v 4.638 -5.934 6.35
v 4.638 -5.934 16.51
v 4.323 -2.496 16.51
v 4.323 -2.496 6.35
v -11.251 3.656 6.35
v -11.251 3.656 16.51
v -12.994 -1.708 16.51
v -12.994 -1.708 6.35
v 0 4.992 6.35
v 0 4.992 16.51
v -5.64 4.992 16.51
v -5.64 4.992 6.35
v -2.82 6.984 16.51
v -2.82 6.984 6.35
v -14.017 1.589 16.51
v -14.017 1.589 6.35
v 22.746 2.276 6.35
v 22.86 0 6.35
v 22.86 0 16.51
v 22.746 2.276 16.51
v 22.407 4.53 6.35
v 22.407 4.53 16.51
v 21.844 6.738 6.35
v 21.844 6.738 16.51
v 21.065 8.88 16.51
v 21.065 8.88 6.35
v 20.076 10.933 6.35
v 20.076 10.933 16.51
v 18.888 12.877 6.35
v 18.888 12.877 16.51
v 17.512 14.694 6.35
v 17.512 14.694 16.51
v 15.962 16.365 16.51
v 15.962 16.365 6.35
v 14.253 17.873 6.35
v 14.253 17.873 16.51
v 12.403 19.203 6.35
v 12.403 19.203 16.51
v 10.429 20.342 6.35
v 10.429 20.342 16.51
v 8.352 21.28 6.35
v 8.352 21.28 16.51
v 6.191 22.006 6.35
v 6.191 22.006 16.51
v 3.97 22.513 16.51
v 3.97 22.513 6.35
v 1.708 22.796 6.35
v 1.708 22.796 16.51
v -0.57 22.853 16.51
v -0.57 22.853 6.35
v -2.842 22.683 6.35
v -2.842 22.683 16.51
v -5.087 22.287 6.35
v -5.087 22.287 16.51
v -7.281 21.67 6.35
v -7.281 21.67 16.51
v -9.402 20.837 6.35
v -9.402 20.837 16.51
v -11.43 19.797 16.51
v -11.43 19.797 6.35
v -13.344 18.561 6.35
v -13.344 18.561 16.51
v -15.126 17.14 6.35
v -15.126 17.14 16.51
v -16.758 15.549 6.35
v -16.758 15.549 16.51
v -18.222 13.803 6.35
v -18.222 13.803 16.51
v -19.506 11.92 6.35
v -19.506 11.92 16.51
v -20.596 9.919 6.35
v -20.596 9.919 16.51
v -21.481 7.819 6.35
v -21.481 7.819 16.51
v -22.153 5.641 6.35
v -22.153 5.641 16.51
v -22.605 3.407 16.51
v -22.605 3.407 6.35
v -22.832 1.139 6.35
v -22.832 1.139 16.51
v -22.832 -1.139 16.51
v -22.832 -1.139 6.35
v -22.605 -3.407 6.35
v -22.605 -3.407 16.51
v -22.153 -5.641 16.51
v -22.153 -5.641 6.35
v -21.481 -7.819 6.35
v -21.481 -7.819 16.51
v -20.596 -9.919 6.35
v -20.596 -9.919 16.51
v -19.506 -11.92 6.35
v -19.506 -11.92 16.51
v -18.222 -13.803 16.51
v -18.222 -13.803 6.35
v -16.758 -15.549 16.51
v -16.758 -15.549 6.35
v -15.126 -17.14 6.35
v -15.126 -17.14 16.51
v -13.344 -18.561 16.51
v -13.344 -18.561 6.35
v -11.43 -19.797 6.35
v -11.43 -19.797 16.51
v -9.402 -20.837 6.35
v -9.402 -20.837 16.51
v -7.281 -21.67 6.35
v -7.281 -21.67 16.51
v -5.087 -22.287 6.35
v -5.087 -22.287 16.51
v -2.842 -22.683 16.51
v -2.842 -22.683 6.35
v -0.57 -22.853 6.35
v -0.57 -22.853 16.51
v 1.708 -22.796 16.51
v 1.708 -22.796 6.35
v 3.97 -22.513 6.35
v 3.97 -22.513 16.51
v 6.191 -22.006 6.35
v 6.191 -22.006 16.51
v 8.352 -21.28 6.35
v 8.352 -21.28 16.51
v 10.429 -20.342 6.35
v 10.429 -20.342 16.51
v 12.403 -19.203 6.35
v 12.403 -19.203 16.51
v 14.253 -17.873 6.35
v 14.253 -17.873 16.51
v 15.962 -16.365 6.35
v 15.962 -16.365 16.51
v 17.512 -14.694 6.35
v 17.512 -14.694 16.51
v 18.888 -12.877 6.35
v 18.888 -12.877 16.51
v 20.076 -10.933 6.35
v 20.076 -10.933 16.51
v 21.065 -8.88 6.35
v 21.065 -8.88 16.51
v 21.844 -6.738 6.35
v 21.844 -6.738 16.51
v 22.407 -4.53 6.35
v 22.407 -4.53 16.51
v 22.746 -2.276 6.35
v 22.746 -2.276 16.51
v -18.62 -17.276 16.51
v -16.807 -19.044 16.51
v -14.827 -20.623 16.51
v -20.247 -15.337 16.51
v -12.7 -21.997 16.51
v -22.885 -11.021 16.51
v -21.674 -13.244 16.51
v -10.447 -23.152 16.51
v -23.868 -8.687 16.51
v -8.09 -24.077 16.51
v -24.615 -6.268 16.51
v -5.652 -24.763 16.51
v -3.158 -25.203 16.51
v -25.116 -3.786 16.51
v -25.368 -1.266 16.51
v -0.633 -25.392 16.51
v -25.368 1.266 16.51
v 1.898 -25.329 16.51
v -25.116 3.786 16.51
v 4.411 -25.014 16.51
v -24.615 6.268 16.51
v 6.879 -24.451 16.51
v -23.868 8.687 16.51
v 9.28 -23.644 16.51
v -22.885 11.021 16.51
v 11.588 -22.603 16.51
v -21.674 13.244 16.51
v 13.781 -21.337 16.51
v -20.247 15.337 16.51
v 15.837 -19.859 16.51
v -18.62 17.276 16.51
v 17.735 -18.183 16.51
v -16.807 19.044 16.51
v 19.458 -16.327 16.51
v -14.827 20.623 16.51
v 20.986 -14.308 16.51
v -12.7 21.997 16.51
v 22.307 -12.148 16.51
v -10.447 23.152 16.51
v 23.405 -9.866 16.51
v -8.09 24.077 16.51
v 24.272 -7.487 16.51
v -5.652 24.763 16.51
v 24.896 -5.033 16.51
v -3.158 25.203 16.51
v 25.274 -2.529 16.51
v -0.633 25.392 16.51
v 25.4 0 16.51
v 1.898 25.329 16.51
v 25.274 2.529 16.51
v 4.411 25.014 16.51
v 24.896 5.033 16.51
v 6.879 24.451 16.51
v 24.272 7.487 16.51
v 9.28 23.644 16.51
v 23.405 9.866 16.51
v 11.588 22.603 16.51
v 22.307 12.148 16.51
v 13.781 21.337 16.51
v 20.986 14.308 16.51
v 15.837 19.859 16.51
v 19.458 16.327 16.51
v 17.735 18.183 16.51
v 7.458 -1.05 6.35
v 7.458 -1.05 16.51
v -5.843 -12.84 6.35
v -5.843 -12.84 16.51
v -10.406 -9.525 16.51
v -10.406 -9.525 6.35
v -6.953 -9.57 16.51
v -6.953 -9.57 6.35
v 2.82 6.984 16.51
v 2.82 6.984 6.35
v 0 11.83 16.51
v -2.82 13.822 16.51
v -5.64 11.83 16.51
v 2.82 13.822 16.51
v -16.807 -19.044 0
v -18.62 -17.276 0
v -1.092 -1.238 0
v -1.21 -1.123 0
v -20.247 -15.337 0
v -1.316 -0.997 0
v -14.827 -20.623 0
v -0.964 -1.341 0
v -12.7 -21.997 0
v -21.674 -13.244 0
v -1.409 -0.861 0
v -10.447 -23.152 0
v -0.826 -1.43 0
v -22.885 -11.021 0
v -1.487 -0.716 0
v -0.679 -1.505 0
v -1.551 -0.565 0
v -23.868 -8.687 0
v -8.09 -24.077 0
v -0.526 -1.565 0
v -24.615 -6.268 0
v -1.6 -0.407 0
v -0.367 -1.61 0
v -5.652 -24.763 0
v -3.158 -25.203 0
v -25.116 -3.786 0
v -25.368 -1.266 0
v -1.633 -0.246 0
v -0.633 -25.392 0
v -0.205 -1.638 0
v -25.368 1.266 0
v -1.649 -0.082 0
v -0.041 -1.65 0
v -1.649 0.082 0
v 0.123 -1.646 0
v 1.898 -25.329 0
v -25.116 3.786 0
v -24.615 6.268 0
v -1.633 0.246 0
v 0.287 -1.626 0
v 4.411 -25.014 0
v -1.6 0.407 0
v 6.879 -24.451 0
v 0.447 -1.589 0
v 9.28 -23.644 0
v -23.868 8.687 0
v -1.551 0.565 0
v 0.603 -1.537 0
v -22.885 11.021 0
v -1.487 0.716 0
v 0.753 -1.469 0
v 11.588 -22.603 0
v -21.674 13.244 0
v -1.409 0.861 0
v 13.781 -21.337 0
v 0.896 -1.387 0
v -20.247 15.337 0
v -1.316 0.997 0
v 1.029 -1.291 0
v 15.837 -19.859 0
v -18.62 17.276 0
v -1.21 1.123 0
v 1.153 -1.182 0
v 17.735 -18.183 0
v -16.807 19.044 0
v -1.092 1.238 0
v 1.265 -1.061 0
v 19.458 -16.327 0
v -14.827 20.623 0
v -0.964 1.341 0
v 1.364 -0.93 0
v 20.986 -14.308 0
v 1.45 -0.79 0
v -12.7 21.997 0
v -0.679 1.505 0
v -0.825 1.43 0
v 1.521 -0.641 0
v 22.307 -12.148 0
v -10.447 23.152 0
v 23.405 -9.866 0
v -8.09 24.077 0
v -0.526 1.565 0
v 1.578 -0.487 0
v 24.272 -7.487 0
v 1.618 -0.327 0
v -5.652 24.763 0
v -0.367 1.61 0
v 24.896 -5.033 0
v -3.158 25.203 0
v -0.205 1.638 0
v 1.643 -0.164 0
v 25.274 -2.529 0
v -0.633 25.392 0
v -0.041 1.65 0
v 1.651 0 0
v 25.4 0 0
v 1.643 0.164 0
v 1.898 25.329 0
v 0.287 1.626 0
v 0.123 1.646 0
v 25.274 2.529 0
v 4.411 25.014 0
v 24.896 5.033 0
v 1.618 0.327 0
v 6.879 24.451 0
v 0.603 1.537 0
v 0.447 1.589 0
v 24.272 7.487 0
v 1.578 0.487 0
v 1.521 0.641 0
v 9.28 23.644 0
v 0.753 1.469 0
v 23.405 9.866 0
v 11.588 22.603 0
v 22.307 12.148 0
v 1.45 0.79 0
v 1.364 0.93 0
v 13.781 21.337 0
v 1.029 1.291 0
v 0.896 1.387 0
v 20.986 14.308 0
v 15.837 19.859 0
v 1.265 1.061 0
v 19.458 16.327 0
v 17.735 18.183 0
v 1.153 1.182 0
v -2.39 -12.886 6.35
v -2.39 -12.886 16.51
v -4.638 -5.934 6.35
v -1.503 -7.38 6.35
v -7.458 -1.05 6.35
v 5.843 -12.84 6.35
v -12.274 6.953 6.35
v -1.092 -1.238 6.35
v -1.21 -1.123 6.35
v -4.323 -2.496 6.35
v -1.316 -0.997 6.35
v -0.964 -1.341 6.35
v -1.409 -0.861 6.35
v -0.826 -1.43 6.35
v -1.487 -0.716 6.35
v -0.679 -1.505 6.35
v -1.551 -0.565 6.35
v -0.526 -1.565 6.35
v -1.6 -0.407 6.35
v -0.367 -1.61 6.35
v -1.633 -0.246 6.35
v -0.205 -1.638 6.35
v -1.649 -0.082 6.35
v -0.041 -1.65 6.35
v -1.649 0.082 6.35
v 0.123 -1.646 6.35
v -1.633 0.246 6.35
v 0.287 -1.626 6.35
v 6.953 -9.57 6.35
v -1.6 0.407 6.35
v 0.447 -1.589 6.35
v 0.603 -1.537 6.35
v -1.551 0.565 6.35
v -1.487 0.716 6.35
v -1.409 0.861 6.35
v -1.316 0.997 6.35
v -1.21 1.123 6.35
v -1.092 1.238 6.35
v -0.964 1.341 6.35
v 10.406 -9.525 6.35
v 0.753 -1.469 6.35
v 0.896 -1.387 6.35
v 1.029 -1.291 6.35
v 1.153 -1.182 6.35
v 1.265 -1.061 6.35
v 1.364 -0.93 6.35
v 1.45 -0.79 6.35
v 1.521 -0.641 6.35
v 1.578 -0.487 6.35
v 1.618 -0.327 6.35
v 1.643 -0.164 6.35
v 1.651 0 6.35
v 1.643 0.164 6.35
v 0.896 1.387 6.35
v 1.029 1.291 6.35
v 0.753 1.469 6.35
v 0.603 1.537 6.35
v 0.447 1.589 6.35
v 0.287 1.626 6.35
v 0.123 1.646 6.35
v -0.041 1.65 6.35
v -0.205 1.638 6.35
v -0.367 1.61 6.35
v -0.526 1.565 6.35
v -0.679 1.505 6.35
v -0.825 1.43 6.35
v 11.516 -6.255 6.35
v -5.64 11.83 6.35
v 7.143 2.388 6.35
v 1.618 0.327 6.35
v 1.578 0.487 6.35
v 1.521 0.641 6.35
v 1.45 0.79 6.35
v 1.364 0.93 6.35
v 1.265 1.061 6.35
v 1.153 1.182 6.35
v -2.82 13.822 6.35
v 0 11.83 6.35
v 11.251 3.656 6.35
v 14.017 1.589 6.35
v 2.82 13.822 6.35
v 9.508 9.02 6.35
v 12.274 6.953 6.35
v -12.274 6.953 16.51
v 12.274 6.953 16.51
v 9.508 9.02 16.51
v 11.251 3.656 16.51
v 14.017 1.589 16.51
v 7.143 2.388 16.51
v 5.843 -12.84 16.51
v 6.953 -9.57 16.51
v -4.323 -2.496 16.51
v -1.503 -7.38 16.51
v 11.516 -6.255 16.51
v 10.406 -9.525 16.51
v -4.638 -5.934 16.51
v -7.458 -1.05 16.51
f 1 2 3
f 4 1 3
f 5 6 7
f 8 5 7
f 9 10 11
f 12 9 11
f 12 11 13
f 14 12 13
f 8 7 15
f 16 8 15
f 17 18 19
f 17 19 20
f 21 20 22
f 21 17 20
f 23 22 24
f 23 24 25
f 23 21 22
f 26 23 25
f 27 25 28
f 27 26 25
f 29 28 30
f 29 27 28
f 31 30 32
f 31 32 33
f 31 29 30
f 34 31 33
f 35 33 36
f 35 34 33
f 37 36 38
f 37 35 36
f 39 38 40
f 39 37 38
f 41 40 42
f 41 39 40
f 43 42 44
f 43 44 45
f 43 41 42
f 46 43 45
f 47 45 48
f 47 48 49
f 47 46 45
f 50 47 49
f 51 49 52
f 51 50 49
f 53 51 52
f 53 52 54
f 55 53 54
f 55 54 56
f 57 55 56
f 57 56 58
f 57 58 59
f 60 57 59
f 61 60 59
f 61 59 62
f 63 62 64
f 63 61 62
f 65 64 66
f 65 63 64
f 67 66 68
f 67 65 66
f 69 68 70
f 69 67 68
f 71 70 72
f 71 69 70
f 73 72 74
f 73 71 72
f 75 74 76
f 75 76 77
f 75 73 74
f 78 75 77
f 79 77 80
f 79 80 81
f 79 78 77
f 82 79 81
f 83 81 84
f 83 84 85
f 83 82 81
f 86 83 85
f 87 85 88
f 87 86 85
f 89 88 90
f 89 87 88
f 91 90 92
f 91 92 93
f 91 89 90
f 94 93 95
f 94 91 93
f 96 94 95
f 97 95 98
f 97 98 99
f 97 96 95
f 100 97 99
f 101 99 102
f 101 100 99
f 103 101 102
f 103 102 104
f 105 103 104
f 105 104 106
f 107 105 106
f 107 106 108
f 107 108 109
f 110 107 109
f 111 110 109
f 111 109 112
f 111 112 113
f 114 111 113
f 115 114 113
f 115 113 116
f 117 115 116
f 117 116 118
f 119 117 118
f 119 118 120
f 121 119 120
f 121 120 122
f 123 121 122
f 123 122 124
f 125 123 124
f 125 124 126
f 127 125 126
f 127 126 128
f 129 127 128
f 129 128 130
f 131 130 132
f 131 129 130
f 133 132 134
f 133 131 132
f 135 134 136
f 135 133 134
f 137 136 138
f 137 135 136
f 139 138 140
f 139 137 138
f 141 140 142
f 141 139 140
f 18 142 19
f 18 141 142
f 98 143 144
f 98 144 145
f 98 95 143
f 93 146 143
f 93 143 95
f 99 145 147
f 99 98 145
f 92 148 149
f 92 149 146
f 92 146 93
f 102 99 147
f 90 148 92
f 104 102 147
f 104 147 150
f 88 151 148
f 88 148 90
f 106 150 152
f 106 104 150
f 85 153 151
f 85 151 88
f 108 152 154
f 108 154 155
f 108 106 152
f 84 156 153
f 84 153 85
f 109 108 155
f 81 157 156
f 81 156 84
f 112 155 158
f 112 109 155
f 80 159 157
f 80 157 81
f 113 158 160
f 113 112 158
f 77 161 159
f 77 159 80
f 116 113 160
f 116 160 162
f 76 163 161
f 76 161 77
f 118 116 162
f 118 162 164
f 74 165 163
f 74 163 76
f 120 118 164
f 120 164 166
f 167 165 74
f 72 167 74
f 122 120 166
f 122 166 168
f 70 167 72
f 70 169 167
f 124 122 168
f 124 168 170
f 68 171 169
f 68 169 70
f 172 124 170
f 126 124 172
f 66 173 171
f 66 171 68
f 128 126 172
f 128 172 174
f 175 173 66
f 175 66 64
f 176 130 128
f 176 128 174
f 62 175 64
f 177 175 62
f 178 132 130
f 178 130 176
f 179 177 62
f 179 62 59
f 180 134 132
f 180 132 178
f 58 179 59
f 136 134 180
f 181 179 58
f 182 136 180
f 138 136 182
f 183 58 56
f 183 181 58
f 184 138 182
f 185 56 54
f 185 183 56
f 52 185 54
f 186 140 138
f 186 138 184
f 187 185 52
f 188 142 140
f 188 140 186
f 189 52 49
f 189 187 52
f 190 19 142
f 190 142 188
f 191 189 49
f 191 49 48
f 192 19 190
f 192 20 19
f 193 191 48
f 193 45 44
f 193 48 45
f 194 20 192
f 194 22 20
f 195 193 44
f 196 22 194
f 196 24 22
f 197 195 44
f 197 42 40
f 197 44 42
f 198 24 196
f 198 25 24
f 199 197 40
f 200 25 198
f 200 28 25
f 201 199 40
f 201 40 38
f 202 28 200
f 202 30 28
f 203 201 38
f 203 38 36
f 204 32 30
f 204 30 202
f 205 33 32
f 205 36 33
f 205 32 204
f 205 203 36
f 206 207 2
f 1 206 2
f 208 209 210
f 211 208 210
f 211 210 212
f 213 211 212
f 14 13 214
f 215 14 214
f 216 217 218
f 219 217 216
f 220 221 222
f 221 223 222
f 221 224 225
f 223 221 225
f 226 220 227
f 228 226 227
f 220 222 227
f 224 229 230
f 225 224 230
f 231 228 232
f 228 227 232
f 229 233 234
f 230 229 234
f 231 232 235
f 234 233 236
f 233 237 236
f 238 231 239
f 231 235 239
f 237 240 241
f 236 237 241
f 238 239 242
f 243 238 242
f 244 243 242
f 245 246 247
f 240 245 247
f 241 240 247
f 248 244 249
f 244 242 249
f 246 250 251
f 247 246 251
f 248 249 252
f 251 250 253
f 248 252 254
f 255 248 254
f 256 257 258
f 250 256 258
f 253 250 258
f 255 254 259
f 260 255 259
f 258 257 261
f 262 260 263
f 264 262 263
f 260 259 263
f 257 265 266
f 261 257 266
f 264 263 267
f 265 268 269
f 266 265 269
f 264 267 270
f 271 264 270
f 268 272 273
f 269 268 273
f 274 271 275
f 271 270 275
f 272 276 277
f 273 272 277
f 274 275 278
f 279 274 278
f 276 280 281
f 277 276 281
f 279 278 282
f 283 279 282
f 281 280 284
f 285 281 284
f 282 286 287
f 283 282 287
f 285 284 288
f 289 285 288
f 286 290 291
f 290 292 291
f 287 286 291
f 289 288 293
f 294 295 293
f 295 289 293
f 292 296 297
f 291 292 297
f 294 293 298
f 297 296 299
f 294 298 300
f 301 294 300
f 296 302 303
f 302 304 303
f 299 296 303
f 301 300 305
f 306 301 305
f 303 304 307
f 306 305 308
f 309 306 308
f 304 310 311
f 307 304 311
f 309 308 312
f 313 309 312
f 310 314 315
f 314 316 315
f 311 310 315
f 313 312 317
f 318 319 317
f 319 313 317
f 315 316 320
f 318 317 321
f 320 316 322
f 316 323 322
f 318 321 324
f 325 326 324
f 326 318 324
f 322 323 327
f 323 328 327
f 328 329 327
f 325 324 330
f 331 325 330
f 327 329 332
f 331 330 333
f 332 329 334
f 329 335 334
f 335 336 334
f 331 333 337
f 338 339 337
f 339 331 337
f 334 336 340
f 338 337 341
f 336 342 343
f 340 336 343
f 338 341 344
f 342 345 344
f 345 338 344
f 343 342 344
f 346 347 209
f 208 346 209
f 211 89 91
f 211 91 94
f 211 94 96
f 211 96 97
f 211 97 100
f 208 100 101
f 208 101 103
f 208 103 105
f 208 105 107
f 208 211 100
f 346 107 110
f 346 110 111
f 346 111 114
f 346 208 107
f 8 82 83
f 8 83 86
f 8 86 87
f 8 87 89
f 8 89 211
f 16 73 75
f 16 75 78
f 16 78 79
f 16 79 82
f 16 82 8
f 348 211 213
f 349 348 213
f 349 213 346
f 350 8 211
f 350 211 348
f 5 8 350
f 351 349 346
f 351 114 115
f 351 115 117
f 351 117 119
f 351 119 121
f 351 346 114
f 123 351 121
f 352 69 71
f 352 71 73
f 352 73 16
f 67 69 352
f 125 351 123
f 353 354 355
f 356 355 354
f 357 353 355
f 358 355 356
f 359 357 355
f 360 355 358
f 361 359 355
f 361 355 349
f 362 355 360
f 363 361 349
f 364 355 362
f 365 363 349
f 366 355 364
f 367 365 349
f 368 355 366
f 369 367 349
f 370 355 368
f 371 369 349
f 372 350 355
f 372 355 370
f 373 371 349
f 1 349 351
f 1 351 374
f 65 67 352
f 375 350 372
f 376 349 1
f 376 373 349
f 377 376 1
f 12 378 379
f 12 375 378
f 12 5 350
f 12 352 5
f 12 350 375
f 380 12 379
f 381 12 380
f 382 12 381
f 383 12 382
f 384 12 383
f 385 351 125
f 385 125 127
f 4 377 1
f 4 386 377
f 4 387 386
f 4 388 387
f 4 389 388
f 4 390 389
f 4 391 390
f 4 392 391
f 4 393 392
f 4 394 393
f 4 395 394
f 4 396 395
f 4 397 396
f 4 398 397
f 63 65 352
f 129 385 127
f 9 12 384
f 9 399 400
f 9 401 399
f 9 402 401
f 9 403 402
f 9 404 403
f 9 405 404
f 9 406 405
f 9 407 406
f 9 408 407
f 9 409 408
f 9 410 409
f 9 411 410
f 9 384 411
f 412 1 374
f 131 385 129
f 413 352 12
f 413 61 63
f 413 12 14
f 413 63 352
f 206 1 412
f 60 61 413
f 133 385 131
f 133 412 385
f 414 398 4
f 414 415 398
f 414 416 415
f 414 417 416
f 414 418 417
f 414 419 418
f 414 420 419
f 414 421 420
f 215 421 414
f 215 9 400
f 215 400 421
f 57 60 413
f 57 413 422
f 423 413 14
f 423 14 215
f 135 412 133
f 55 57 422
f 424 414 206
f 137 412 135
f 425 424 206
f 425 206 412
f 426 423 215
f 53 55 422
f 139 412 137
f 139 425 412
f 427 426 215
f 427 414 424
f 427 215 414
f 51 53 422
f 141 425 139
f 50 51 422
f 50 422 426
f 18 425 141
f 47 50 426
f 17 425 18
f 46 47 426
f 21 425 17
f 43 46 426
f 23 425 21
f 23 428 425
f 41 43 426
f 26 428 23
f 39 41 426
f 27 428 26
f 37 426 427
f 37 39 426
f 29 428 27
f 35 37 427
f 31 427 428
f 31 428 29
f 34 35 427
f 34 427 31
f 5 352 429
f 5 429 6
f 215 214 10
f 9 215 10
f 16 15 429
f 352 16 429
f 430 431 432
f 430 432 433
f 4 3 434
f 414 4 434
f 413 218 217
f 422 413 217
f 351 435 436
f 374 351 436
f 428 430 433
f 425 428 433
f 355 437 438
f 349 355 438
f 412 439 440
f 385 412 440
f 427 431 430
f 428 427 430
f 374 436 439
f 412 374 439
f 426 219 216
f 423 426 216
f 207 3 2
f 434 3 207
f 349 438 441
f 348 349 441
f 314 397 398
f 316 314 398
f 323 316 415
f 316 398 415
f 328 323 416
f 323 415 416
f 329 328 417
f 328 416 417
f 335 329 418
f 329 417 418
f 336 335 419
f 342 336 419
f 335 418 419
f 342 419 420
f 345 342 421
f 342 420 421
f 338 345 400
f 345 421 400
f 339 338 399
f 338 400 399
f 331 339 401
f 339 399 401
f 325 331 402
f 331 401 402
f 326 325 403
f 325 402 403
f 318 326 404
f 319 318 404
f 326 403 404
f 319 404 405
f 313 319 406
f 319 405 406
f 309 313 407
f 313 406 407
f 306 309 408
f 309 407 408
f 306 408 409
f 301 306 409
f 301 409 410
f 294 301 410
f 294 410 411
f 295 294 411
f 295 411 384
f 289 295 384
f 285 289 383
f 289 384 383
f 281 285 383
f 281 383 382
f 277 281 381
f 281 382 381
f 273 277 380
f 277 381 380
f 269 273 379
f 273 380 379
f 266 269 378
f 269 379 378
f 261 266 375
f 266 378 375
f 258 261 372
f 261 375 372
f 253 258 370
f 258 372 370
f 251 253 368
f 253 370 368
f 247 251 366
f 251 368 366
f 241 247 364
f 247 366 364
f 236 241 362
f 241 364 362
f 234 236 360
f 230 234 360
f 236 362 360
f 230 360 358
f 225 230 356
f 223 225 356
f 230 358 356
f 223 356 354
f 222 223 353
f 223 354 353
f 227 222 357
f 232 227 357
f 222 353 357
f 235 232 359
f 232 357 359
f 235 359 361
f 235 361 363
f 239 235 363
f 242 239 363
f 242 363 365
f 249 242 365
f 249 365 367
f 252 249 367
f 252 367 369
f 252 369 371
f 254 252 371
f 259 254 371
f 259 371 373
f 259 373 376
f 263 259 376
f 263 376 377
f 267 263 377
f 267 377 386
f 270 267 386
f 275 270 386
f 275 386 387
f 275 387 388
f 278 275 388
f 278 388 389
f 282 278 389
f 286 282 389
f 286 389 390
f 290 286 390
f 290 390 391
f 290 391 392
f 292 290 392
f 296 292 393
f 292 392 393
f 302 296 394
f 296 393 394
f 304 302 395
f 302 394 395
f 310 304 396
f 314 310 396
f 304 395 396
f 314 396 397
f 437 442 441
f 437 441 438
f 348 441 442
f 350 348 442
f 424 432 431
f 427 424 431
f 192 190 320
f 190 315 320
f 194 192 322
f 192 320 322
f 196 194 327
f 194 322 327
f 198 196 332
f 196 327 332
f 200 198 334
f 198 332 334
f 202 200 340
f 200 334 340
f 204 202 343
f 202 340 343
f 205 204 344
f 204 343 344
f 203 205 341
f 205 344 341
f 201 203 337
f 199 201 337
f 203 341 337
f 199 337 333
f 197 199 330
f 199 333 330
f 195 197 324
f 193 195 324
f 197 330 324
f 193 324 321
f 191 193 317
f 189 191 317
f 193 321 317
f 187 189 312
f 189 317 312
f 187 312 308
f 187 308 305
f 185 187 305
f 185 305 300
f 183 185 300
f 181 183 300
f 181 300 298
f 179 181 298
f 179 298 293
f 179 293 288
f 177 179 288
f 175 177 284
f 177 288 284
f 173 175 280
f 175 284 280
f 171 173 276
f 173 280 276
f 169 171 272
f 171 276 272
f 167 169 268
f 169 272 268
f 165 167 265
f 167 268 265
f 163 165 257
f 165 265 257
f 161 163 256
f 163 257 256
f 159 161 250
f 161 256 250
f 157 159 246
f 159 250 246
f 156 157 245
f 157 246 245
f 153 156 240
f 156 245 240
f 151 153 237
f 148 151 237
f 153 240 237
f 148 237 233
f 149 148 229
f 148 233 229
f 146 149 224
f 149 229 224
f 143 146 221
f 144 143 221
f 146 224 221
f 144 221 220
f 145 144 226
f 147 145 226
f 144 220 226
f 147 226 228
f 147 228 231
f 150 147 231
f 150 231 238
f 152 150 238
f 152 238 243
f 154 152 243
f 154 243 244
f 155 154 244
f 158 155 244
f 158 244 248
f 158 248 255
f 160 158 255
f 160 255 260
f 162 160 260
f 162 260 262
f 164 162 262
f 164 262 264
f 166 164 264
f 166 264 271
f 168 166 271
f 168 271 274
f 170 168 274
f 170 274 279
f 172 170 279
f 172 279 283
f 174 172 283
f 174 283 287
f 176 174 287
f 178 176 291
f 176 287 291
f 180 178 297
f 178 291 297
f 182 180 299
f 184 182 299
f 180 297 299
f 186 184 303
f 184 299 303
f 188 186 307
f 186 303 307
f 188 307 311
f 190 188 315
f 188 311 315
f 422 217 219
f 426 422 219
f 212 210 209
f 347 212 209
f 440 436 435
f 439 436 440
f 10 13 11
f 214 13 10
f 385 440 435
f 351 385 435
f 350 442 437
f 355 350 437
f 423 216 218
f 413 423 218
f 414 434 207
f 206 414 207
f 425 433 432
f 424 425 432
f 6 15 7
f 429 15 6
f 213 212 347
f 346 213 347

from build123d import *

# Parameters (mm, degrees)
F0_R     = 25.4
F1_DEPTH = 6.35
F2_R     = 22.86
F3_DEPTH = 10.16
F4_R     = 22.86
F4_R_2   = 20.32
F4_R_3   = 14.8488227635
F5_DEPTH = 10.16
F6_R     = 25.4
F6_R_2   = 22.86
F7_DEPTH = 10.16
F8_R     = 1.651
F9_DEPTH = 6.35


with BuildPart() as f1:
    # F0 (on Top) → F1 (new body)
    with BuildSketch(Plane.XY):
        Circle(F0_R)
    extrude(amount=F1_DEPTH)

    # F2 (on face) → F3 (join)
    with BuildSketch(Plane.XY.offset(6.35)):
        Circle(F2_R)
    extrude(amount=F3_DEPTH)

    # F4 (on face) → F5 (cut)
    with BuildSketch(Plane.XY.offset(16.51)):
        Circle(F4_R)
        Circle(F4_R_2, mode=Mode.SUBTRACT)
        Circle(F4_R_2)
        with BuildLine():
            ThreePointArc((2.8200390162, 17.158628647), (13.2553445021, 11.254643452), (17.3888227635, 0))
            ThreePointArc((17.3888227635, 0), (-11.254643452, -13.2553445021), (-2.8200390162, 17.158628647))
            ThreePointArc((-2.8200390162, 17.158628647), (0, 17.3888227635), (2.8200390162, 17.158628647))
        make_face(mode=Mode.SUBTRACT)
        with BuildLine():
            ThreePointArc((-2.8200390162, 17.158628647), (-11.254643452, -13.2553445021), (17.3888227635, 0))
            ThreePointArc((17.3888227635, 0), (13.2553445021, 11.254643452), (2.8200390162, 17.158628647))
            Line((2.8200390162, 17.158628647), (-2.8200390162, 17.158628647))
        make_face()
        Circle(F4_R_3, mode=Mode.SUBTRACT)
        Circle(F4_R_3)
        Polygon((-10.4057336106, -9.5245266735), (-6.9533198674, -9.5704237527), (-2.3904008896, -12.8855784419), (-5.8428146328, -12.8396813627), align=None, mode=Mode.SUBTRACT)
        Polygon((-7.4583858915, -1.049800532), (-4.3231170224, -2.4959527766), (-1.5030780063, -7.380403632), (-4.6383468754, -5.9342513873), align=None, mode=Mode.SUBTRACT)
        Polygon((5.8428146328, -12.8396813627), (6.9533198674, -9.5704237527), (11.5162388451, -6.2552690636), (10.4057336106, -9.5245266735), align=None, mode=Mode.SUBTRACT)
        Polygon((4.6383468754, -5.9342513873), (4.3231170224, -2.4959527766), (7.1431560386, 2.3884980787), (7.4583858915, -1.049800532), align=None, mode=Mode.SUBTRACT)
        Polygon((-12.2739116821, 6.9532001517), (-11.2507078801, 3.6555765868), (-12.9935878417, -1.7084563782), (-14.0167916437, 1.5891671866), align=None, mode=Mode.SUBTRACT)
        Polygon((2.8200390162, 6.9840519193), (0, 4.9919055533), (-5.6400780323, 4.9919055533), (-2.8200390162, 6.9840519193), align=None, mode=Mode.SUBTRACT)
        Polygon((2.8200390162, 13.8218406978), (0, 11.8296943319), (-5.6400780323, 11.8296943319), (-2.8200390162, 13.8218406978), align=None, mode=Mode.SUBTRACT)
        Polygon((14.0167916437, 1.5891671866), (11.2507078801, 3.6555765868), (9.5078279185, 9.0196095519), (12.2739116821, 6.9532001517), align=None, mode=Mode.SUBTRACT)
        with BuildLine():
            Line((-2.8200390162, 17.158628647), (2.8200390162, 17.158628647))
            ThreePointArc((2.8200390162, 17.158628647), (0, 17.3888227635), (-2.8200390162, 17.158628647))
        make_face()
    extrude(amount=-F5_DEPTH, mode=Mode.SUBTRACT)

    # F6 (on face) → F7 (join)
    with BuildSketch(Plane.XY.offset(6.35)):
        Circle(F6_R)
        Circle(F6_R_2, mode=Mode.SUBTRACT)
    extrude(amount=F7_DEPTH)

    # F8 (on face) → F9 (cut, through all)
    with BuildSketch(Plane.XY.offset(6.35)):
        Circle(F8_R)
    extrude(amount=-F9_DEPTH, mode=Mode.SUBTRACT)


solid = f1.part
